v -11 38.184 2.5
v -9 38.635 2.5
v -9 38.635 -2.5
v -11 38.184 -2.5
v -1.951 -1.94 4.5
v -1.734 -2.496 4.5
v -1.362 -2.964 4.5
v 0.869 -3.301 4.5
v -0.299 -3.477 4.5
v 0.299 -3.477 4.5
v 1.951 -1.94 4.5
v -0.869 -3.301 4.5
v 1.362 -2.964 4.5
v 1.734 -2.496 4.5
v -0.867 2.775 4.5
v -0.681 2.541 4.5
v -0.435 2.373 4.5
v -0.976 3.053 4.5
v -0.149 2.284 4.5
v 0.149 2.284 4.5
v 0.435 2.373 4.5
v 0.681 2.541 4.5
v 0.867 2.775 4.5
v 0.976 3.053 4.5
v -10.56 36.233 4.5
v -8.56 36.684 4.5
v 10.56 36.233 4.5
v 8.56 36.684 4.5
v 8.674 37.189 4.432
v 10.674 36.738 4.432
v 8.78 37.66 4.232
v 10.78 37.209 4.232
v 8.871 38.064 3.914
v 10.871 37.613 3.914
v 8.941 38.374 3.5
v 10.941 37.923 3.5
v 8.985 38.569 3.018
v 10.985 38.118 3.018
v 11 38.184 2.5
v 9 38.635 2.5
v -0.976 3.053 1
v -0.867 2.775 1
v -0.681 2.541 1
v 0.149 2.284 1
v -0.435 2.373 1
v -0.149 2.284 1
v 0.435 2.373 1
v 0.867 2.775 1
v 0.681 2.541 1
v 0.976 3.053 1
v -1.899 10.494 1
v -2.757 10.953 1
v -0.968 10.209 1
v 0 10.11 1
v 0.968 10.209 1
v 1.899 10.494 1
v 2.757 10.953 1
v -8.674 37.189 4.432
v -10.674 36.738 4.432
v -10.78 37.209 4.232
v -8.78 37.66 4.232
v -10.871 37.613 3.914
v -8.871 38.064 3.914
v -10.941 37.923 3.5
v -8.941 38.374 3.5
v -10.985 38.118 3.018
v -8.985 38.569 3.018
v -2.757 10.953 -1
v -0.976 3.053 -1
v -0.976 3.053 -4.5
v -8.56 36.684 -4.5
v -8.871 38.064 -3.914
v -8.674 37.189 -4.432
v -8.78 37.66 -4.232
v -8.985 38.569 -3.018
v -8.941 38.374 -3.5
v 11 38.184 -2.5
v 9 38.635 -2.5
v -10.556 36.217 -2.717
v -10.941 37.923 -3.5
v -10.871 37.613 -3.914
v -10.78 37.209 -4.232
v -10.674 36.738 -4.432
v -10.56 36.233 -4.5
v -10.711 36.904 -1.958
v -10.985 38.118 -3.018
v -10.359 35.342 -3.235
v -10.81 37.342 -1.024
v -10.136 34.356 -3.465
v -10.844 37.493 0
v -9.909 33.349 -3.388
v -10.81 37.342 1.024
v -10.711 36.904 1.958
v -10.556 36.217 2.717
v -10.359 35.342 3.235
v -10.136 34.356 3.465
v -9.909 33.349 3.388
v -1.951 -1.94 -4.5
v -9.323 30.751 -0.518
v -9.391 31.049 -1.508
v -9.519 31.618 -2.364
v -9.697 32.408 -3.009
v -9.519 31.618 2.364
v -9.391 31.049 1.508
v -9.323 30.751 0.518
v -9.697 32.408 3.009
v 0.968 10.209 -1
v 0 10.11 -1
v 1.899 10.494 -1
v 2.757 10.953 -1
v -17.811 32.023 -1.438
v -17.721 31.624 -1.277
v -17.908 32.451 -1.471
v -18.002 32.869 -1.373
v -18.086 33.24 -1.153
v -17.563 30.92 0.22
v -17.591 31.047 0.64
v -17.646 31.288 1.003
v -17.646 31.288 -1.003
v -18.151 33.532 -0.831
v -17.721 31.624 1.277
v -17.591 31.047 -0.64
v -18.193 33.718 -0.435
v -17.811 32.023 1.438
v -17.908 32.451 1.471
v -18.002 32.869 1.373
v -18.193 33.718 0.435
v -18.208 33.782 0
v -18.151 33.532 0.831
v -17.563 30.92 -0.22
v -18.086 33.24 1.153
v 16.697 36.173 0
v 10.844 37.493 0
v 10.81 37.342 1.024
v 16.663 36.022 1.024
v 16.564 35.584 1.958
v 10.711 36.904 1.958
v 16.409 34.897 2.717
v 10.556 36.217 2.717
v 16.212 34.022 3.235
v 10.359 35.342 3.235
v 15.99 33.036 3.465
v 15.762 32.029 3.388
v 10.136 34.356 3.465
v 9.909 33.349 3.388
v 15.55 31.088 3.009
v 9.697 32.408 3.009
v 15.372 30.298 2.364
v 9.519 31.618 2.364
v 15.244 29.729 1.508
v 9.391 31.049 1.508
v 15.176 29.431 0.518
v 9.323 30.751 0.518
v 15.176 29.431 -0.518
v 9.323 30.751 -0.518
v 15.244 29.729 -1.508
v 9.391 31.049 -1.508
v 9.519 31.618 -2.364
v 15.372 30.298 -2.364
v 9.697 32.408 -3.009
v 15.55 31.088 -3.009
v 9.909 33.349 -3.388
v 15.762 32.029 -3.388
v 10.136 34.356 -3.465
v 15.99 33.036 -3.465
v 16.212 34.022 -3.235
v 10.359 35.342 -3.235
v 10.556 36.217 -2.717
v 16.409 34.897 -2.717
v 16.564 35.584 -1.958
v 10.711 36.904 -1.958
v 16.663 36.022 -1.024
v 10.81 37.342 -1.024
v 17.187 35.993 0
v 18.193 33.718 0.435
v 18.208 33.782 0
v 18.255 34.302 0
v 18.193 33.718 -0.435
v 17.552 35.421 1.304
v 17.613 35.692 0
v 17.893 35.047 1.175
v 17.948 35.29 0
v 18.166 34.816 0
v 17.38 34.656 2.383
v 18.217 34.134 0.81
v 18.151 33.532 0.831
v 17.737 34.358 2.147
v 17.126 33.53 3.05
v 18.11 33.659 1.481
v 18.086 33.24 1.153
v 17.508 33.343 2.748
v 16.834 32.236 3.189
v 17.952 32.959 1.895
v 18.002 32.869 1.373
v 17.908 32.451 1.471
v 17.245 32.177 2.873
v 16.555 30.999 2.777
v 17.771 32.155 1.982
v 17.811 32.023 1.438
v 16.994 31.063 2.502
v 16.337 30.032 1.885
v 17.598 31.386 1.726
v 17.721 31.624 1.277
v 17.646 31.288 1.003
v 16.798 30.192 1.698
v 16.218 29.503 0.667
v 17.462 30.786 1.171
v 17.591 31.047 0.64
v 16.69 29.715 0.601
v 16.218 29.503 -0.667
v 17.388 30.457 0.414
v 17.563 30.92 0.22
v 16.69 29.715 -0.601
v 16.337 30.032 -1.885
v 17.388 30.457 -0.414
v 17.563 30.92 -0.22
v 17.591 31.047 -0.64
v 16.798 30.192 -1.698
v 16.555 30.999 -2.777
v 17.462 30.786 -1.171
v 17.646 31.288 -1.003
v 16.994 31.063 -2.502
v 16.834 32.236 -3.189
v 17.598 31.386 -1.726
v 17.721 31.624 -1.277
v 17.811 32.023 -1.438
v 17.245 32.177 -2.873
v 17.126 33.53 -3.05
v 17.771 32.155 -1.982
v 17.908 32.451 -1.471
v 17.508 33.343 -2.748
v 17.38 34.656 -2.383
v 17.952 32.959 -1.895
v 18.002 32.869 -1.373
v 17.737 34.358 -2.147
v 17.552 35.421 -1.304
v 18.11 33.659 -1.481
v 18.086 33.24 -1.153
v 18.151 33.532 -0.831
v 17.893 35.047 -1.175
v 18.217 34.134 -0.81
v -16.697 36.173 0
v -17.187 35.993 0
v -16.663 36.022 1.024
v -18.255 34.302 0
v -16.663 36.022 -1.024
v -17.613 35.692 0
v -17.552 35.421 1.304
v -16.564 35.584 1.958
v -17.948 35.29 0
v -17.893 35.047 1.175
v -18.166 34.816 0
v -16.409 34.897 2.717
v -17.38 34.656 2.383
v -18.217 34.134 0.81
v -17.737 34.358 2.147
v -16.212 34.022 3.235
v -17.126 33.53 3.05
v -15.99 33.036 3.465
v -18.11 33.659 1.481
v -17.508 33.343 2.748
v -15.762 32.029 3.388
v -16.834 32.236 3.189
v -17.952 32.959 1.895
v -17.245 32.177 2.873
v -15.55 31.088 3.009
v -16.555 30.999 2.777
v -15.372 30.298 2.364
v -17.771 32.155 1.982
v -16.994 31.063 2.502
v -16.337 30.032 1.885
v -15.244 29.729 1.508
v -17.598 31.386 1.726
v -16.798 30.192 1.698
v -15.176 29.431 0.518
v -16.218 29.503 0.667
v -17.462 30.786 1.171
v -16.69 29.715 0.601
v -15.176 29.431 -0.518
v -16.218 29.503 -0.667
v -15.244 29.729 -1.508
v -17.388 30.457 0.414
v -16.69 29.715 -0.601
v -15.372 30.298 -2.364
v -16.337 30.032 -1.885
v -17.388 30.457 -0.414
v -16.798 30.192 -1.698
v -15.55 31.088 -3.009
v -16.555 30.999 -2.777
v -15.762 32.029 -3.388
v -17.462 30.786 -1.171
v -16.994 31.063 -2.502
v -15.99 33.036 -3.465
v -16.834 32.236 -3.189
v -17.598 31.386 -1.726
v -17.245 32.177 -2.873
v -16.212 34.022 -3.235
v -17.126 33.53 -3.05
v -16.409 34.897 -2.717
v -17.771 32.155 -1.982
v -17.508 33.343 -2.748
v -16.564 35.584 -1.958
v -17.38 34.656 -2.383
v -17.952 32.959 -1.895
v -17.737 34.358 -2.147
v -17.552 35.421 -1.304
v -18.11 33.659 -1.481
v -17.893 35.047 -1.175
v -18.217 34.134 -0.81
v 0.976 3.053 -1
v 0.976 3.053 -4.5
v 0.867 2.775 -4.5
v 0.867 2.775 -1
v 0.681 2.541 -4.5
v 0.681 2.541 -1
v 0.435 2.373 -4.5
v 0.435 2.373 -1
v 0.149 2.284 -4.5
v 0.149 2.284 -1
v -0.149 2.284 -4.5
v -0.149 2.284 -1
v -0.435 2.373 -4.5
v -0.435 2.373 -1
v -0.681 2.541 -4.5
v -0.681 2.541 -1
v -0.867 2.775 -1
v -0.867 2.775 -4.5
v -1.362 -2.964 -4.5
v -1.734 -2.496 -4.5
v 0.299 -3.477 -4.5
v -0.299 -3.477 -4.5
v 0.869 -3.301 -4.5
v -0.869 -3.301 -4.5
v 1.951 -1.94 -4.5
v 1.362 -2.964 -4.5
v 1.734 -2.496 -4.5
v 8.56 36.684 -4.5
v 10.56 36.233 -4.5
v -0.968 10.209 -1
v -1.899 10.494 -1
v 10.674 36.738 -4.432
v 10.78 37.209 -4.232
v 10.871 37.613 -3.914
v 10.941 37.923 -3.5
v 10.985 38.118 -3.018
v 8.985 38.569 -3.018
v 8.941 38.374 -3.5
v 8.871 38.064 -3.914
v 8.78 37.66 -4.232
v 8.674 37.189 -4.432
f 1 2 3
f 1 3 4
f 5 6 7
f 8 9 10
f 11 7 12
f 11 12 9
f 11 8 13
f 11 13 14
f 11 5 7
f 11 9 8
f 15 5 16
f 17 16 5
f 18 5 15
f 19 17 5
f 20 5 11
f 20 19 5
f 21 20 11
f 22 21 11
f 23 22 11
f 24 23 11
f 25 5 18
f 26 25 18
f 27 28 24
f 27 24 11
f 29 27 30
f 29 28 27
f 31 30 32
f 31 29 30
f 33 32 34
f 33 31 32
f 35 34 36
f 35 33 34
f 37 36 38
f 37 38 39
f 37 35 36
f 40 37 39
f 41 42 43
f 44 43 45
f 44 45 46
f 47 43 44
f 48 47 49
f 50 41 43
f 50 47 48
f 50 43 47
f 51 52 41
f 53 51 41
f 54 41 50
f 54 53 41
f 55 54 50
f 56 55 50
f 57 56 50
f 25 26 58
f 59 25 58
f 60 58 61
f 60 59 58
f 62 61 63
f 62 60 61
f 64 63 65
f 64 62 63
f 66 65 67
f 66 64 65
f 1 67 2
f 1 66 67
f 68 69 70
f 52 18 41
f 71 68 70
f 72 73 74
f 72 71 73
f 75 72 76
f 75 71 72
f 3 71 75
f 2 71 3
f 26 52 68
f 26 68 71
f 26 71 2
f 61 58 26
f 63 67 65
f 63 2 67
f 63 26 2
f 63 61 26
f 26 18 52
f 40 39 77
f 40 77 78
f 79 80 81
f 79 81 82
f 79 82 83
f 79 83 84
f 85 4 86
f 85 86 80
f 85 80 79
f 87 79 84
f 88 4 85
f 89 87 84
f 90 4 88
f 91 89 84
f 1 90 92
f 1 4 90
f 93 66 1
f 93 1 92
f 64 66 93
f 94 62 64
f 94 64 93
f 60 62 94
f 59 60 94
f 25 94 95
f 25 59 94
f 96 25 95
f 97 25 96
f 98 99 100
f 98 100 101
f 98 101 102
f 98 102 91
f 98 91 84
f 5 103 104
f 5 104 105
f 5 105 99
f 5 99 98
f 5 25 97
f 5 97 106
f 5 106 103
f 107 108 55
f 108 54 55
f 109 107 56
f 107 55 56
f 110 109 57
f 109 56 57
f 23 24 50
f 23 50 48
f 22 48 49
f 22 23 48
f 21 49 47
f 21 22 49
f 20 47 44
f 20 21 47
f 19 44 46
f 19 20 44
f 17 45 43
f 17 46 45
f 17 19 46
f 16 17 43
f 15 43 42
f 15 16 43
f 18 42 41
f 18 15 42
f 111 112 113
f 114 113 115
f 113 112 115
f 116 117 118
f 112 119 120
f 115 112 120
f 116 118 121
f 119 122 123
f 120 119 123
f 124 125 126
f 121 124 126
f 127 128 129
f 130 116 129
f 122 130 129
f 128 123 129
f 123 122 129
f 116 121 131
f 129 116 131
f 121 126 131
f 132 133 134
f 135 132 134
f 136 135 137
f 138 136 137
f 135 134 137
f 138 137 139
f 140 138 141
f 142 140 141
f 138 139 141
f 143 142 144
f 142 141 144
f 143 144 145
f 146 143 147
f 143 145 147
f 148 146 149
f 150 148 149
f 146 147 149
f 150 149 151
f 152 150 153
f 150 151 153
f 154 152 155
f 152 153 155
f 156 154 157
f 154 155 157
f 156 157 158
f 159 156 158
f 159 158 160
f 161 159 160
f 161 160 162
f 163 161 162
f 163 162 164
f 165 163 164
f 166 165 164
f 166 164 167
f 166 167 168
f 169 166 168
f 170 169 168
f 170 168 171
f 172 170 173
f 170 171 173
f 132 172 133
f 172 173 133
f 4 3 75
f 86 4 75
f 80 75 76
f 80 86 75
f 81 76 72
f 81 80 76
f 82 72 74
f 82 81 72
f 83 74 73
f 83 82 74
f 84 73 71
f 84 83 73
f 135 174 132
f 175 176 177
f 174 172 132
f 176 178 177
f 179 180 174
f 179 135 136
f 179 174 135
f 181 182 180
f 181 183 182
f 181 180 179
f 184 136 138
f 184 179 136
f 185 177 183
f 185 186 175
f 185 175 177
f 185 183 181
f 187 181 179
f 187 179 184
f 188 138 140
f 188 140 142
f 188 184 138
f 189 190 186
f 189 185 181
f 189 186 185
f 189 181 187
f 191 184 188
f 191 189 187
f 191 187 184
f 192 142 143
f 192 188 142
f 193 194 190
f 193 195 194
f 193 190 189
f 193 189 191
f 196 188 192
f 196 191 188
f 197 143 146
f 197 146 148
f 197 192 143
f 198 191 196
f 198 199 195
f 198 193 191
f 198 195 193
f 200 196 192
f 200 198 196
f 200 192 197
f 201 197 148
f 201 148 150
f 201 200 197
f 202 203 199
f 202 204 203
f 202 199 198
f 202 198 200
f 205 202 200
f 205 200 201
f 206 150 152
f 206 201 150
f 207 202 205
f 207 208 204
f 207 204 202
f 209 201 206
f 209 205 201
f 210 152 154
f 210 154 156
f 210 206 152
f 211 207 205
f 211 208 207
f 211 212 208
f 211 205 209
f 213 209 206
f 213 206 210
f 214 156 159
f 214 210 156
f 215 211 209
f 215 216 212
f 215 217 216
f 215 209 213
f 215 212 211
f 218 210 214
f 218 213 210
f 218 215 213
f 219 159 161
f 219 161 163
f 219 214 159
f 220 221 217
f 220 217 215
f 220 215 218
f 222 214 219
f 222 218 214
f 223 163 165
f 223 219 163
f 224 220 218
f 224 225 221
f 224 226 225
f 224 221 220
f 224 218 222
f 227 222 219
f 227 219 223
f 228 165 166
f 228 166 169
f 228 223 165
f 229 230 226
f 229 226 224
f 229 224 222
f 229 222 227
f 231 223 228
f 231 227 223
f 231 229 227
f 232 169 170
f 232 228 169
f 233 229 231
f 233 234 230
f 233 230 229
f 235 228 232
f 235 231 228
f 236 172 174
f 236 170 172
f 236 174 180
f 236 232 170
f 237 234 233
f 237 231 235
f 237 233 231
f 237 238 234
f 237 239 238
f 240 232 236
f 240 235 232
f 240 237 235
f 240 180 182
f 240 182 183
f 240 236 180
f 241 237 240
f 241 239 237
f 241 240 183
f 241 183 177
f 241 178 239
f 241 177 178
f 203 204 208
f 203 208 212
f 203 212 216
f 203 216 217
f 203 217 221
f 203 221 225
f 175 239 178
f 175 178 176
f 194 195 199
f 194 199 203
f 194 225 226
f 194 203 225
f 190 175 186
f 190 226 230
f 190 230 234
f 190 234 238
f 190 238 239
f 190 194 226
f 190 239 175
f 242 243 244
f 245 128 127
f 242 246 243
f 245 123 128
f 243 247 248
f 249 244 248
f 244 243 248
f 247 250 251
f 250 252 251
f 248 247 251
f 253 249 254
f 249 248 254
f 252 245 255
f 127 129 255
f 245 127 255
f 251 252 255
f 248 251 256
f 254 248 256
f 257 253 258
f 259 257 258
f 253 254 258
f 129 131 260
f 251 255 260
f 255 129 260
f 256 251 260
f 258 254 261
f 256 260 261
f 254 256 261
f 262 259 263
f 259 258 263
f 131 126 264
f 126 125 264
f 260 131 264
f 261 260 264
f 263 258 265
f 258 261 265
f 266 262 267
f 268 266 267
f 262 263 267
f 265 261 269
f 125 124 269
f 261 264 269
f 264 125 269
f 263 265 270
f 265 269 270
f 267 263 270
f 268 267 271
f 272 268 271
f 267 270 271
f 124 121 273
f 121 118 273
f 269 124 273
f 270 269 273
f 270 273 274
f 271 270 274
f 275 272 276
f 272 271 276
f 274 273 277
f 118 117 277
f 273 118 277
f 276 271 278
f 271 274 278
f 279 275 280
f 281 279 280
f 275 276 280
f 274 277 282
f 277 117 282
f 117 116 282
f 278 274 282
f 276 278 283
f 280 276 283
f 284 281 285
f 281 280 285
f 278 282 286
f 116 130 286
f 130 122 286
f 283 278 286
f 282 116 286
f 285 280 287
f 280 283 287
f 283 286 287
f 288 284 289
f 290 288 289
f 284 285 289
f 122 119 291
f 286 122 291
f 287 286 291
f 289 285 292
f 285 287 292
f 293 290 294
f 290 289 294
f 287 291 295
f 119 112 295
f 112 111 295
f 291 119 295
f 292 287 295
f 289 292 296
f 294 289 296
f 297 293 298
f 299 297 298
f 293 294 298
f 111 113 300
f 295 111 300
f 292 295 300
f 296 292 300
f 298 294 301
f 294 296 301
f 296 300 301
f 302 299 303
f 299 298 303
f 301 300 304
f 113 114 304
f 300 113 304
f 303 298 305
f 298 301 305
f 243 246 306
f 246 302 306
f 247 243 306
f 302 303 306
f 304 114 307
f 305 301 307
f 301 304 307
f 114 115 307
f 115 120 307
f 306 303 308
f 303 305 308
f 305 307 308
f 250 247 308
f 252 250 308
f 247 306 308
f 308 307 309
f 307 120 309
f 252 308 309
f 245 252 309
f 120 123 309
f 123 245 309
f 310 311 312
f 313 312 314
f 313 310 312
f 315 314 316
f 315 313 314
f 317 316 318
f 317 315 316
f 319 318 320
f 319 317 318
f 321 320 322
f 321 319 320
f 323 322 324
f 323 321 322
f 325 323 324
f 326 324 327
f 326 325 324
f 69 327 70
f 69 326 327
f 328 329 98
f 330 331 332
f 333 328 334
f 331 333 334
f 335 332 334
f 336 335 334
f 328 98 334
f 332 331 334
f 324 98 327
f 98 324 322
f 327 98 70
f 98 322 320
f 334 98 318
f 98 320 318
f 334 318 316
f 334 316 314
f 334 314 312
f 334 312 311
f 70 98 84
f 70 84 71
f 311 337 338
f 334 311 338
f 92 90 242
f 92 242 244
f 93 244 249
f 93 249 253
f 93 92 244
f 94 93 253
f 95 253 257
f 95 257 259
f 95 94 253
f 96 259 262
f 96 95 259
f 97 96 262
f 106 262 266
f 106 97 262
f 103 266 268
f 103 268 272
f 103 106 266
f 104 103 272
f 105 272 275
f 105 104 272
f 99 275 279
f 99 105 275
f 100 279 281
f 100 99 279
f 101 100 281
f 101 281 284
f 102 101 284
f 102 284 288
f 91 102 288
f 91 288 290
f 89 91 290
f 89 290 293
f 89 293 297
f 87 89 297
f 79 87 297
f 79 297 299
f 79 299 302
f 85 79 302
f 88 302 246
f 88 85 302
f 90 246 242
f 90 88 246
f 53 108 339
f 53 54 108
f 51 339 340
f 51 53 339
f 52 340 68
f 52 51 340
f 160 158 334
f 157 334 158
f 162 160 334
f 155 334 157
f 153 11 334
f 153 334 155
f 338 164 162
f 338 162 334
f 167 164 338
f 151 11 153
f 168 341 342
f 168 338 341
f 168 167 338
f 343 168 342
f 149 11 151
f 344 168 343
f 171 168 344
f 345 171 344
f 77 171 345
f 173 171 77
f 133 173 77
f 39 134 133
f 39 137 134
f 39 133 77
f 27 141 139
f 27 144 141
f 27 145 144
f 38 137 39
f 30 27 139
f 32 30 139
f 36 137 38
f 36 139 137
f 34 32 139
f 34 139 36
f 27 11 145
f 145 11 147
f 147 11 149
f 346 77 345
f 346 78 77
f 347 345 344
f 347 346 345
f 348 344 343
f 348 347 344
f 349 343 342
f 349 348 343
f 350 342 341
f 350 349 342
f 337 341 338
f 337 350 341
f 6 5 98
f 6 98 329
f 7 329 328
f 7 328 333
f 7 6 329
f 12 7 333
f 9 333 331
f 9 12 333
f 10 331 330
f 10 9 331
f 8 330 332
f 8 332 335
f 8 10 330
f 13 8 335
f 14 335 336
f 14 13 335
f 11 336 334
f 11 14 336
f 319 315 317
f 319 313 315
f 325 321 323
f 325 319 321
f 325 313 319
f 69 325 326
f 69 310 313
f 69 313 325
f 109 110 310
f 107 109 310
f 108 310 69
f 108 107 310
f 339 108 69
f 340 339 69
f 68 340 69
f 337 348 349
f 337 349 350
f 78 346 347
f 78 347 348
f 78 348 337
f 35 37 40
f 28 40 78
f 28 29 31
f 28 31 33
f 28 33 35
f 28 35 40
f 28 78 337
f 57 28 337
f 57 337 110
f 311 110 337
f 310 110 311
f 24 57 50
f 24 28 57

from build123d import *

# Parameters (mm, degrees)
F1_DEPTH      = 4.5
F1_DEPTH_BACK = 4.5
F3_DEPTH      = 1
F3_DEPTH_BACK = 1
F4_R          = 3.475
F5_DEPTH      = 8
F6_R          = 2
F8_R          = 2


with BuildPart() as f1:
    # F0 (on Top) → F1 (new body, two sides)
    with BuildSketch(Plane.XY) as f1_sk:
        with BuildLine():
            Line((-10.9997768011, 38.1843295809), (-1.9510017572, -1.9396118641))
            ThreePointArc((-1.9510017572, -1.9396118641), (0, -3.499620792), (1.9510017572, -1.9396118641))
            Line((1.9510017572, -1.9396118641), (10.9997768011, 38.1843295809))
            Line((10.9997768011, 38.1843295809), (9, 38.6353204298))
            Line((9, 38.6353204298), (0.9755008786, 3.0532077891))
            ThreePointArc((0.9755008786, 3.0532077891), (0, 2.2732033252), (-0.9755008786, 3.0532077891))
            Line((-0.9755008786, 3.0532077891), (-9, 38.6353204298))
            Line((-9, 38.6353204298), (-10.9997768011, 38.1843295809))
        make_face()
    extrude(amount=F1_DEPTH)
    extrude(f1_sk.sketch, amount=-F1_DEPTH_BACK)

    # F2 (on Top) → F3 (join, two sides)
    with BuildSketch(Plane.XY) as f3_sk:
        with BuildLine():
            ThreePointArc((4.067072408, 12.170038485), (0.0224234698, 10.1095648017), (-4.0222254685, 12.170038485))
            Line((-4.0222254685, 12.170038485), (-1.7974023818, -0.8990558693))
            Line((-1.7974023818, -0.8990558693), (1.8422493213, -0.8990558693))
            Line((1.8422493213, -0.8990558693), (4.067072408, 12.170038485))
        make_face()
    extrude(amount=F3_DEPTH)
    extrude(f3_sk.sketch, amount=-F3_DEPTH_BACK)

    # F4 (on face) → F5 (join)
    with BuildSketch(Plane(origin=(2.2728291349, -0.5125697729, 0), x_dir=(0.219995536, 0.9755008786, 0), z_dir=(0.9755008786, -0.219995536, 0))):
        with Locations((35.4849845171, 0)):
            Circle(F4_R)
    extrude(amount=F5_DEPTH)

    # F6
    f6_edges = [f1.edges().sort_by_distance(p)[0] for p in [
        (17.11889, 28.953234, 0),
    ]]
    fillet(f6_edges, radius=F6_R)

    # F7: F1 across plane


with BuildPart() as f1_1:
    add(f1.part)
    add(f1.part.mirror(Plane.YZ))

    # F8
    f8_edges = [f1_1.edges().sort_by_distance(p)[0] for p in [
        (9.999888, 38.409825, 4.5),
        (9.999888, 38.409825, -4.5),
        (-9.999888, 38.409825, -4.5),
        (-9.999888, 38.409825, 4.5),
    ]]
    fillet(f8_edges, radius=F8_R)


solid = f1_1.part
